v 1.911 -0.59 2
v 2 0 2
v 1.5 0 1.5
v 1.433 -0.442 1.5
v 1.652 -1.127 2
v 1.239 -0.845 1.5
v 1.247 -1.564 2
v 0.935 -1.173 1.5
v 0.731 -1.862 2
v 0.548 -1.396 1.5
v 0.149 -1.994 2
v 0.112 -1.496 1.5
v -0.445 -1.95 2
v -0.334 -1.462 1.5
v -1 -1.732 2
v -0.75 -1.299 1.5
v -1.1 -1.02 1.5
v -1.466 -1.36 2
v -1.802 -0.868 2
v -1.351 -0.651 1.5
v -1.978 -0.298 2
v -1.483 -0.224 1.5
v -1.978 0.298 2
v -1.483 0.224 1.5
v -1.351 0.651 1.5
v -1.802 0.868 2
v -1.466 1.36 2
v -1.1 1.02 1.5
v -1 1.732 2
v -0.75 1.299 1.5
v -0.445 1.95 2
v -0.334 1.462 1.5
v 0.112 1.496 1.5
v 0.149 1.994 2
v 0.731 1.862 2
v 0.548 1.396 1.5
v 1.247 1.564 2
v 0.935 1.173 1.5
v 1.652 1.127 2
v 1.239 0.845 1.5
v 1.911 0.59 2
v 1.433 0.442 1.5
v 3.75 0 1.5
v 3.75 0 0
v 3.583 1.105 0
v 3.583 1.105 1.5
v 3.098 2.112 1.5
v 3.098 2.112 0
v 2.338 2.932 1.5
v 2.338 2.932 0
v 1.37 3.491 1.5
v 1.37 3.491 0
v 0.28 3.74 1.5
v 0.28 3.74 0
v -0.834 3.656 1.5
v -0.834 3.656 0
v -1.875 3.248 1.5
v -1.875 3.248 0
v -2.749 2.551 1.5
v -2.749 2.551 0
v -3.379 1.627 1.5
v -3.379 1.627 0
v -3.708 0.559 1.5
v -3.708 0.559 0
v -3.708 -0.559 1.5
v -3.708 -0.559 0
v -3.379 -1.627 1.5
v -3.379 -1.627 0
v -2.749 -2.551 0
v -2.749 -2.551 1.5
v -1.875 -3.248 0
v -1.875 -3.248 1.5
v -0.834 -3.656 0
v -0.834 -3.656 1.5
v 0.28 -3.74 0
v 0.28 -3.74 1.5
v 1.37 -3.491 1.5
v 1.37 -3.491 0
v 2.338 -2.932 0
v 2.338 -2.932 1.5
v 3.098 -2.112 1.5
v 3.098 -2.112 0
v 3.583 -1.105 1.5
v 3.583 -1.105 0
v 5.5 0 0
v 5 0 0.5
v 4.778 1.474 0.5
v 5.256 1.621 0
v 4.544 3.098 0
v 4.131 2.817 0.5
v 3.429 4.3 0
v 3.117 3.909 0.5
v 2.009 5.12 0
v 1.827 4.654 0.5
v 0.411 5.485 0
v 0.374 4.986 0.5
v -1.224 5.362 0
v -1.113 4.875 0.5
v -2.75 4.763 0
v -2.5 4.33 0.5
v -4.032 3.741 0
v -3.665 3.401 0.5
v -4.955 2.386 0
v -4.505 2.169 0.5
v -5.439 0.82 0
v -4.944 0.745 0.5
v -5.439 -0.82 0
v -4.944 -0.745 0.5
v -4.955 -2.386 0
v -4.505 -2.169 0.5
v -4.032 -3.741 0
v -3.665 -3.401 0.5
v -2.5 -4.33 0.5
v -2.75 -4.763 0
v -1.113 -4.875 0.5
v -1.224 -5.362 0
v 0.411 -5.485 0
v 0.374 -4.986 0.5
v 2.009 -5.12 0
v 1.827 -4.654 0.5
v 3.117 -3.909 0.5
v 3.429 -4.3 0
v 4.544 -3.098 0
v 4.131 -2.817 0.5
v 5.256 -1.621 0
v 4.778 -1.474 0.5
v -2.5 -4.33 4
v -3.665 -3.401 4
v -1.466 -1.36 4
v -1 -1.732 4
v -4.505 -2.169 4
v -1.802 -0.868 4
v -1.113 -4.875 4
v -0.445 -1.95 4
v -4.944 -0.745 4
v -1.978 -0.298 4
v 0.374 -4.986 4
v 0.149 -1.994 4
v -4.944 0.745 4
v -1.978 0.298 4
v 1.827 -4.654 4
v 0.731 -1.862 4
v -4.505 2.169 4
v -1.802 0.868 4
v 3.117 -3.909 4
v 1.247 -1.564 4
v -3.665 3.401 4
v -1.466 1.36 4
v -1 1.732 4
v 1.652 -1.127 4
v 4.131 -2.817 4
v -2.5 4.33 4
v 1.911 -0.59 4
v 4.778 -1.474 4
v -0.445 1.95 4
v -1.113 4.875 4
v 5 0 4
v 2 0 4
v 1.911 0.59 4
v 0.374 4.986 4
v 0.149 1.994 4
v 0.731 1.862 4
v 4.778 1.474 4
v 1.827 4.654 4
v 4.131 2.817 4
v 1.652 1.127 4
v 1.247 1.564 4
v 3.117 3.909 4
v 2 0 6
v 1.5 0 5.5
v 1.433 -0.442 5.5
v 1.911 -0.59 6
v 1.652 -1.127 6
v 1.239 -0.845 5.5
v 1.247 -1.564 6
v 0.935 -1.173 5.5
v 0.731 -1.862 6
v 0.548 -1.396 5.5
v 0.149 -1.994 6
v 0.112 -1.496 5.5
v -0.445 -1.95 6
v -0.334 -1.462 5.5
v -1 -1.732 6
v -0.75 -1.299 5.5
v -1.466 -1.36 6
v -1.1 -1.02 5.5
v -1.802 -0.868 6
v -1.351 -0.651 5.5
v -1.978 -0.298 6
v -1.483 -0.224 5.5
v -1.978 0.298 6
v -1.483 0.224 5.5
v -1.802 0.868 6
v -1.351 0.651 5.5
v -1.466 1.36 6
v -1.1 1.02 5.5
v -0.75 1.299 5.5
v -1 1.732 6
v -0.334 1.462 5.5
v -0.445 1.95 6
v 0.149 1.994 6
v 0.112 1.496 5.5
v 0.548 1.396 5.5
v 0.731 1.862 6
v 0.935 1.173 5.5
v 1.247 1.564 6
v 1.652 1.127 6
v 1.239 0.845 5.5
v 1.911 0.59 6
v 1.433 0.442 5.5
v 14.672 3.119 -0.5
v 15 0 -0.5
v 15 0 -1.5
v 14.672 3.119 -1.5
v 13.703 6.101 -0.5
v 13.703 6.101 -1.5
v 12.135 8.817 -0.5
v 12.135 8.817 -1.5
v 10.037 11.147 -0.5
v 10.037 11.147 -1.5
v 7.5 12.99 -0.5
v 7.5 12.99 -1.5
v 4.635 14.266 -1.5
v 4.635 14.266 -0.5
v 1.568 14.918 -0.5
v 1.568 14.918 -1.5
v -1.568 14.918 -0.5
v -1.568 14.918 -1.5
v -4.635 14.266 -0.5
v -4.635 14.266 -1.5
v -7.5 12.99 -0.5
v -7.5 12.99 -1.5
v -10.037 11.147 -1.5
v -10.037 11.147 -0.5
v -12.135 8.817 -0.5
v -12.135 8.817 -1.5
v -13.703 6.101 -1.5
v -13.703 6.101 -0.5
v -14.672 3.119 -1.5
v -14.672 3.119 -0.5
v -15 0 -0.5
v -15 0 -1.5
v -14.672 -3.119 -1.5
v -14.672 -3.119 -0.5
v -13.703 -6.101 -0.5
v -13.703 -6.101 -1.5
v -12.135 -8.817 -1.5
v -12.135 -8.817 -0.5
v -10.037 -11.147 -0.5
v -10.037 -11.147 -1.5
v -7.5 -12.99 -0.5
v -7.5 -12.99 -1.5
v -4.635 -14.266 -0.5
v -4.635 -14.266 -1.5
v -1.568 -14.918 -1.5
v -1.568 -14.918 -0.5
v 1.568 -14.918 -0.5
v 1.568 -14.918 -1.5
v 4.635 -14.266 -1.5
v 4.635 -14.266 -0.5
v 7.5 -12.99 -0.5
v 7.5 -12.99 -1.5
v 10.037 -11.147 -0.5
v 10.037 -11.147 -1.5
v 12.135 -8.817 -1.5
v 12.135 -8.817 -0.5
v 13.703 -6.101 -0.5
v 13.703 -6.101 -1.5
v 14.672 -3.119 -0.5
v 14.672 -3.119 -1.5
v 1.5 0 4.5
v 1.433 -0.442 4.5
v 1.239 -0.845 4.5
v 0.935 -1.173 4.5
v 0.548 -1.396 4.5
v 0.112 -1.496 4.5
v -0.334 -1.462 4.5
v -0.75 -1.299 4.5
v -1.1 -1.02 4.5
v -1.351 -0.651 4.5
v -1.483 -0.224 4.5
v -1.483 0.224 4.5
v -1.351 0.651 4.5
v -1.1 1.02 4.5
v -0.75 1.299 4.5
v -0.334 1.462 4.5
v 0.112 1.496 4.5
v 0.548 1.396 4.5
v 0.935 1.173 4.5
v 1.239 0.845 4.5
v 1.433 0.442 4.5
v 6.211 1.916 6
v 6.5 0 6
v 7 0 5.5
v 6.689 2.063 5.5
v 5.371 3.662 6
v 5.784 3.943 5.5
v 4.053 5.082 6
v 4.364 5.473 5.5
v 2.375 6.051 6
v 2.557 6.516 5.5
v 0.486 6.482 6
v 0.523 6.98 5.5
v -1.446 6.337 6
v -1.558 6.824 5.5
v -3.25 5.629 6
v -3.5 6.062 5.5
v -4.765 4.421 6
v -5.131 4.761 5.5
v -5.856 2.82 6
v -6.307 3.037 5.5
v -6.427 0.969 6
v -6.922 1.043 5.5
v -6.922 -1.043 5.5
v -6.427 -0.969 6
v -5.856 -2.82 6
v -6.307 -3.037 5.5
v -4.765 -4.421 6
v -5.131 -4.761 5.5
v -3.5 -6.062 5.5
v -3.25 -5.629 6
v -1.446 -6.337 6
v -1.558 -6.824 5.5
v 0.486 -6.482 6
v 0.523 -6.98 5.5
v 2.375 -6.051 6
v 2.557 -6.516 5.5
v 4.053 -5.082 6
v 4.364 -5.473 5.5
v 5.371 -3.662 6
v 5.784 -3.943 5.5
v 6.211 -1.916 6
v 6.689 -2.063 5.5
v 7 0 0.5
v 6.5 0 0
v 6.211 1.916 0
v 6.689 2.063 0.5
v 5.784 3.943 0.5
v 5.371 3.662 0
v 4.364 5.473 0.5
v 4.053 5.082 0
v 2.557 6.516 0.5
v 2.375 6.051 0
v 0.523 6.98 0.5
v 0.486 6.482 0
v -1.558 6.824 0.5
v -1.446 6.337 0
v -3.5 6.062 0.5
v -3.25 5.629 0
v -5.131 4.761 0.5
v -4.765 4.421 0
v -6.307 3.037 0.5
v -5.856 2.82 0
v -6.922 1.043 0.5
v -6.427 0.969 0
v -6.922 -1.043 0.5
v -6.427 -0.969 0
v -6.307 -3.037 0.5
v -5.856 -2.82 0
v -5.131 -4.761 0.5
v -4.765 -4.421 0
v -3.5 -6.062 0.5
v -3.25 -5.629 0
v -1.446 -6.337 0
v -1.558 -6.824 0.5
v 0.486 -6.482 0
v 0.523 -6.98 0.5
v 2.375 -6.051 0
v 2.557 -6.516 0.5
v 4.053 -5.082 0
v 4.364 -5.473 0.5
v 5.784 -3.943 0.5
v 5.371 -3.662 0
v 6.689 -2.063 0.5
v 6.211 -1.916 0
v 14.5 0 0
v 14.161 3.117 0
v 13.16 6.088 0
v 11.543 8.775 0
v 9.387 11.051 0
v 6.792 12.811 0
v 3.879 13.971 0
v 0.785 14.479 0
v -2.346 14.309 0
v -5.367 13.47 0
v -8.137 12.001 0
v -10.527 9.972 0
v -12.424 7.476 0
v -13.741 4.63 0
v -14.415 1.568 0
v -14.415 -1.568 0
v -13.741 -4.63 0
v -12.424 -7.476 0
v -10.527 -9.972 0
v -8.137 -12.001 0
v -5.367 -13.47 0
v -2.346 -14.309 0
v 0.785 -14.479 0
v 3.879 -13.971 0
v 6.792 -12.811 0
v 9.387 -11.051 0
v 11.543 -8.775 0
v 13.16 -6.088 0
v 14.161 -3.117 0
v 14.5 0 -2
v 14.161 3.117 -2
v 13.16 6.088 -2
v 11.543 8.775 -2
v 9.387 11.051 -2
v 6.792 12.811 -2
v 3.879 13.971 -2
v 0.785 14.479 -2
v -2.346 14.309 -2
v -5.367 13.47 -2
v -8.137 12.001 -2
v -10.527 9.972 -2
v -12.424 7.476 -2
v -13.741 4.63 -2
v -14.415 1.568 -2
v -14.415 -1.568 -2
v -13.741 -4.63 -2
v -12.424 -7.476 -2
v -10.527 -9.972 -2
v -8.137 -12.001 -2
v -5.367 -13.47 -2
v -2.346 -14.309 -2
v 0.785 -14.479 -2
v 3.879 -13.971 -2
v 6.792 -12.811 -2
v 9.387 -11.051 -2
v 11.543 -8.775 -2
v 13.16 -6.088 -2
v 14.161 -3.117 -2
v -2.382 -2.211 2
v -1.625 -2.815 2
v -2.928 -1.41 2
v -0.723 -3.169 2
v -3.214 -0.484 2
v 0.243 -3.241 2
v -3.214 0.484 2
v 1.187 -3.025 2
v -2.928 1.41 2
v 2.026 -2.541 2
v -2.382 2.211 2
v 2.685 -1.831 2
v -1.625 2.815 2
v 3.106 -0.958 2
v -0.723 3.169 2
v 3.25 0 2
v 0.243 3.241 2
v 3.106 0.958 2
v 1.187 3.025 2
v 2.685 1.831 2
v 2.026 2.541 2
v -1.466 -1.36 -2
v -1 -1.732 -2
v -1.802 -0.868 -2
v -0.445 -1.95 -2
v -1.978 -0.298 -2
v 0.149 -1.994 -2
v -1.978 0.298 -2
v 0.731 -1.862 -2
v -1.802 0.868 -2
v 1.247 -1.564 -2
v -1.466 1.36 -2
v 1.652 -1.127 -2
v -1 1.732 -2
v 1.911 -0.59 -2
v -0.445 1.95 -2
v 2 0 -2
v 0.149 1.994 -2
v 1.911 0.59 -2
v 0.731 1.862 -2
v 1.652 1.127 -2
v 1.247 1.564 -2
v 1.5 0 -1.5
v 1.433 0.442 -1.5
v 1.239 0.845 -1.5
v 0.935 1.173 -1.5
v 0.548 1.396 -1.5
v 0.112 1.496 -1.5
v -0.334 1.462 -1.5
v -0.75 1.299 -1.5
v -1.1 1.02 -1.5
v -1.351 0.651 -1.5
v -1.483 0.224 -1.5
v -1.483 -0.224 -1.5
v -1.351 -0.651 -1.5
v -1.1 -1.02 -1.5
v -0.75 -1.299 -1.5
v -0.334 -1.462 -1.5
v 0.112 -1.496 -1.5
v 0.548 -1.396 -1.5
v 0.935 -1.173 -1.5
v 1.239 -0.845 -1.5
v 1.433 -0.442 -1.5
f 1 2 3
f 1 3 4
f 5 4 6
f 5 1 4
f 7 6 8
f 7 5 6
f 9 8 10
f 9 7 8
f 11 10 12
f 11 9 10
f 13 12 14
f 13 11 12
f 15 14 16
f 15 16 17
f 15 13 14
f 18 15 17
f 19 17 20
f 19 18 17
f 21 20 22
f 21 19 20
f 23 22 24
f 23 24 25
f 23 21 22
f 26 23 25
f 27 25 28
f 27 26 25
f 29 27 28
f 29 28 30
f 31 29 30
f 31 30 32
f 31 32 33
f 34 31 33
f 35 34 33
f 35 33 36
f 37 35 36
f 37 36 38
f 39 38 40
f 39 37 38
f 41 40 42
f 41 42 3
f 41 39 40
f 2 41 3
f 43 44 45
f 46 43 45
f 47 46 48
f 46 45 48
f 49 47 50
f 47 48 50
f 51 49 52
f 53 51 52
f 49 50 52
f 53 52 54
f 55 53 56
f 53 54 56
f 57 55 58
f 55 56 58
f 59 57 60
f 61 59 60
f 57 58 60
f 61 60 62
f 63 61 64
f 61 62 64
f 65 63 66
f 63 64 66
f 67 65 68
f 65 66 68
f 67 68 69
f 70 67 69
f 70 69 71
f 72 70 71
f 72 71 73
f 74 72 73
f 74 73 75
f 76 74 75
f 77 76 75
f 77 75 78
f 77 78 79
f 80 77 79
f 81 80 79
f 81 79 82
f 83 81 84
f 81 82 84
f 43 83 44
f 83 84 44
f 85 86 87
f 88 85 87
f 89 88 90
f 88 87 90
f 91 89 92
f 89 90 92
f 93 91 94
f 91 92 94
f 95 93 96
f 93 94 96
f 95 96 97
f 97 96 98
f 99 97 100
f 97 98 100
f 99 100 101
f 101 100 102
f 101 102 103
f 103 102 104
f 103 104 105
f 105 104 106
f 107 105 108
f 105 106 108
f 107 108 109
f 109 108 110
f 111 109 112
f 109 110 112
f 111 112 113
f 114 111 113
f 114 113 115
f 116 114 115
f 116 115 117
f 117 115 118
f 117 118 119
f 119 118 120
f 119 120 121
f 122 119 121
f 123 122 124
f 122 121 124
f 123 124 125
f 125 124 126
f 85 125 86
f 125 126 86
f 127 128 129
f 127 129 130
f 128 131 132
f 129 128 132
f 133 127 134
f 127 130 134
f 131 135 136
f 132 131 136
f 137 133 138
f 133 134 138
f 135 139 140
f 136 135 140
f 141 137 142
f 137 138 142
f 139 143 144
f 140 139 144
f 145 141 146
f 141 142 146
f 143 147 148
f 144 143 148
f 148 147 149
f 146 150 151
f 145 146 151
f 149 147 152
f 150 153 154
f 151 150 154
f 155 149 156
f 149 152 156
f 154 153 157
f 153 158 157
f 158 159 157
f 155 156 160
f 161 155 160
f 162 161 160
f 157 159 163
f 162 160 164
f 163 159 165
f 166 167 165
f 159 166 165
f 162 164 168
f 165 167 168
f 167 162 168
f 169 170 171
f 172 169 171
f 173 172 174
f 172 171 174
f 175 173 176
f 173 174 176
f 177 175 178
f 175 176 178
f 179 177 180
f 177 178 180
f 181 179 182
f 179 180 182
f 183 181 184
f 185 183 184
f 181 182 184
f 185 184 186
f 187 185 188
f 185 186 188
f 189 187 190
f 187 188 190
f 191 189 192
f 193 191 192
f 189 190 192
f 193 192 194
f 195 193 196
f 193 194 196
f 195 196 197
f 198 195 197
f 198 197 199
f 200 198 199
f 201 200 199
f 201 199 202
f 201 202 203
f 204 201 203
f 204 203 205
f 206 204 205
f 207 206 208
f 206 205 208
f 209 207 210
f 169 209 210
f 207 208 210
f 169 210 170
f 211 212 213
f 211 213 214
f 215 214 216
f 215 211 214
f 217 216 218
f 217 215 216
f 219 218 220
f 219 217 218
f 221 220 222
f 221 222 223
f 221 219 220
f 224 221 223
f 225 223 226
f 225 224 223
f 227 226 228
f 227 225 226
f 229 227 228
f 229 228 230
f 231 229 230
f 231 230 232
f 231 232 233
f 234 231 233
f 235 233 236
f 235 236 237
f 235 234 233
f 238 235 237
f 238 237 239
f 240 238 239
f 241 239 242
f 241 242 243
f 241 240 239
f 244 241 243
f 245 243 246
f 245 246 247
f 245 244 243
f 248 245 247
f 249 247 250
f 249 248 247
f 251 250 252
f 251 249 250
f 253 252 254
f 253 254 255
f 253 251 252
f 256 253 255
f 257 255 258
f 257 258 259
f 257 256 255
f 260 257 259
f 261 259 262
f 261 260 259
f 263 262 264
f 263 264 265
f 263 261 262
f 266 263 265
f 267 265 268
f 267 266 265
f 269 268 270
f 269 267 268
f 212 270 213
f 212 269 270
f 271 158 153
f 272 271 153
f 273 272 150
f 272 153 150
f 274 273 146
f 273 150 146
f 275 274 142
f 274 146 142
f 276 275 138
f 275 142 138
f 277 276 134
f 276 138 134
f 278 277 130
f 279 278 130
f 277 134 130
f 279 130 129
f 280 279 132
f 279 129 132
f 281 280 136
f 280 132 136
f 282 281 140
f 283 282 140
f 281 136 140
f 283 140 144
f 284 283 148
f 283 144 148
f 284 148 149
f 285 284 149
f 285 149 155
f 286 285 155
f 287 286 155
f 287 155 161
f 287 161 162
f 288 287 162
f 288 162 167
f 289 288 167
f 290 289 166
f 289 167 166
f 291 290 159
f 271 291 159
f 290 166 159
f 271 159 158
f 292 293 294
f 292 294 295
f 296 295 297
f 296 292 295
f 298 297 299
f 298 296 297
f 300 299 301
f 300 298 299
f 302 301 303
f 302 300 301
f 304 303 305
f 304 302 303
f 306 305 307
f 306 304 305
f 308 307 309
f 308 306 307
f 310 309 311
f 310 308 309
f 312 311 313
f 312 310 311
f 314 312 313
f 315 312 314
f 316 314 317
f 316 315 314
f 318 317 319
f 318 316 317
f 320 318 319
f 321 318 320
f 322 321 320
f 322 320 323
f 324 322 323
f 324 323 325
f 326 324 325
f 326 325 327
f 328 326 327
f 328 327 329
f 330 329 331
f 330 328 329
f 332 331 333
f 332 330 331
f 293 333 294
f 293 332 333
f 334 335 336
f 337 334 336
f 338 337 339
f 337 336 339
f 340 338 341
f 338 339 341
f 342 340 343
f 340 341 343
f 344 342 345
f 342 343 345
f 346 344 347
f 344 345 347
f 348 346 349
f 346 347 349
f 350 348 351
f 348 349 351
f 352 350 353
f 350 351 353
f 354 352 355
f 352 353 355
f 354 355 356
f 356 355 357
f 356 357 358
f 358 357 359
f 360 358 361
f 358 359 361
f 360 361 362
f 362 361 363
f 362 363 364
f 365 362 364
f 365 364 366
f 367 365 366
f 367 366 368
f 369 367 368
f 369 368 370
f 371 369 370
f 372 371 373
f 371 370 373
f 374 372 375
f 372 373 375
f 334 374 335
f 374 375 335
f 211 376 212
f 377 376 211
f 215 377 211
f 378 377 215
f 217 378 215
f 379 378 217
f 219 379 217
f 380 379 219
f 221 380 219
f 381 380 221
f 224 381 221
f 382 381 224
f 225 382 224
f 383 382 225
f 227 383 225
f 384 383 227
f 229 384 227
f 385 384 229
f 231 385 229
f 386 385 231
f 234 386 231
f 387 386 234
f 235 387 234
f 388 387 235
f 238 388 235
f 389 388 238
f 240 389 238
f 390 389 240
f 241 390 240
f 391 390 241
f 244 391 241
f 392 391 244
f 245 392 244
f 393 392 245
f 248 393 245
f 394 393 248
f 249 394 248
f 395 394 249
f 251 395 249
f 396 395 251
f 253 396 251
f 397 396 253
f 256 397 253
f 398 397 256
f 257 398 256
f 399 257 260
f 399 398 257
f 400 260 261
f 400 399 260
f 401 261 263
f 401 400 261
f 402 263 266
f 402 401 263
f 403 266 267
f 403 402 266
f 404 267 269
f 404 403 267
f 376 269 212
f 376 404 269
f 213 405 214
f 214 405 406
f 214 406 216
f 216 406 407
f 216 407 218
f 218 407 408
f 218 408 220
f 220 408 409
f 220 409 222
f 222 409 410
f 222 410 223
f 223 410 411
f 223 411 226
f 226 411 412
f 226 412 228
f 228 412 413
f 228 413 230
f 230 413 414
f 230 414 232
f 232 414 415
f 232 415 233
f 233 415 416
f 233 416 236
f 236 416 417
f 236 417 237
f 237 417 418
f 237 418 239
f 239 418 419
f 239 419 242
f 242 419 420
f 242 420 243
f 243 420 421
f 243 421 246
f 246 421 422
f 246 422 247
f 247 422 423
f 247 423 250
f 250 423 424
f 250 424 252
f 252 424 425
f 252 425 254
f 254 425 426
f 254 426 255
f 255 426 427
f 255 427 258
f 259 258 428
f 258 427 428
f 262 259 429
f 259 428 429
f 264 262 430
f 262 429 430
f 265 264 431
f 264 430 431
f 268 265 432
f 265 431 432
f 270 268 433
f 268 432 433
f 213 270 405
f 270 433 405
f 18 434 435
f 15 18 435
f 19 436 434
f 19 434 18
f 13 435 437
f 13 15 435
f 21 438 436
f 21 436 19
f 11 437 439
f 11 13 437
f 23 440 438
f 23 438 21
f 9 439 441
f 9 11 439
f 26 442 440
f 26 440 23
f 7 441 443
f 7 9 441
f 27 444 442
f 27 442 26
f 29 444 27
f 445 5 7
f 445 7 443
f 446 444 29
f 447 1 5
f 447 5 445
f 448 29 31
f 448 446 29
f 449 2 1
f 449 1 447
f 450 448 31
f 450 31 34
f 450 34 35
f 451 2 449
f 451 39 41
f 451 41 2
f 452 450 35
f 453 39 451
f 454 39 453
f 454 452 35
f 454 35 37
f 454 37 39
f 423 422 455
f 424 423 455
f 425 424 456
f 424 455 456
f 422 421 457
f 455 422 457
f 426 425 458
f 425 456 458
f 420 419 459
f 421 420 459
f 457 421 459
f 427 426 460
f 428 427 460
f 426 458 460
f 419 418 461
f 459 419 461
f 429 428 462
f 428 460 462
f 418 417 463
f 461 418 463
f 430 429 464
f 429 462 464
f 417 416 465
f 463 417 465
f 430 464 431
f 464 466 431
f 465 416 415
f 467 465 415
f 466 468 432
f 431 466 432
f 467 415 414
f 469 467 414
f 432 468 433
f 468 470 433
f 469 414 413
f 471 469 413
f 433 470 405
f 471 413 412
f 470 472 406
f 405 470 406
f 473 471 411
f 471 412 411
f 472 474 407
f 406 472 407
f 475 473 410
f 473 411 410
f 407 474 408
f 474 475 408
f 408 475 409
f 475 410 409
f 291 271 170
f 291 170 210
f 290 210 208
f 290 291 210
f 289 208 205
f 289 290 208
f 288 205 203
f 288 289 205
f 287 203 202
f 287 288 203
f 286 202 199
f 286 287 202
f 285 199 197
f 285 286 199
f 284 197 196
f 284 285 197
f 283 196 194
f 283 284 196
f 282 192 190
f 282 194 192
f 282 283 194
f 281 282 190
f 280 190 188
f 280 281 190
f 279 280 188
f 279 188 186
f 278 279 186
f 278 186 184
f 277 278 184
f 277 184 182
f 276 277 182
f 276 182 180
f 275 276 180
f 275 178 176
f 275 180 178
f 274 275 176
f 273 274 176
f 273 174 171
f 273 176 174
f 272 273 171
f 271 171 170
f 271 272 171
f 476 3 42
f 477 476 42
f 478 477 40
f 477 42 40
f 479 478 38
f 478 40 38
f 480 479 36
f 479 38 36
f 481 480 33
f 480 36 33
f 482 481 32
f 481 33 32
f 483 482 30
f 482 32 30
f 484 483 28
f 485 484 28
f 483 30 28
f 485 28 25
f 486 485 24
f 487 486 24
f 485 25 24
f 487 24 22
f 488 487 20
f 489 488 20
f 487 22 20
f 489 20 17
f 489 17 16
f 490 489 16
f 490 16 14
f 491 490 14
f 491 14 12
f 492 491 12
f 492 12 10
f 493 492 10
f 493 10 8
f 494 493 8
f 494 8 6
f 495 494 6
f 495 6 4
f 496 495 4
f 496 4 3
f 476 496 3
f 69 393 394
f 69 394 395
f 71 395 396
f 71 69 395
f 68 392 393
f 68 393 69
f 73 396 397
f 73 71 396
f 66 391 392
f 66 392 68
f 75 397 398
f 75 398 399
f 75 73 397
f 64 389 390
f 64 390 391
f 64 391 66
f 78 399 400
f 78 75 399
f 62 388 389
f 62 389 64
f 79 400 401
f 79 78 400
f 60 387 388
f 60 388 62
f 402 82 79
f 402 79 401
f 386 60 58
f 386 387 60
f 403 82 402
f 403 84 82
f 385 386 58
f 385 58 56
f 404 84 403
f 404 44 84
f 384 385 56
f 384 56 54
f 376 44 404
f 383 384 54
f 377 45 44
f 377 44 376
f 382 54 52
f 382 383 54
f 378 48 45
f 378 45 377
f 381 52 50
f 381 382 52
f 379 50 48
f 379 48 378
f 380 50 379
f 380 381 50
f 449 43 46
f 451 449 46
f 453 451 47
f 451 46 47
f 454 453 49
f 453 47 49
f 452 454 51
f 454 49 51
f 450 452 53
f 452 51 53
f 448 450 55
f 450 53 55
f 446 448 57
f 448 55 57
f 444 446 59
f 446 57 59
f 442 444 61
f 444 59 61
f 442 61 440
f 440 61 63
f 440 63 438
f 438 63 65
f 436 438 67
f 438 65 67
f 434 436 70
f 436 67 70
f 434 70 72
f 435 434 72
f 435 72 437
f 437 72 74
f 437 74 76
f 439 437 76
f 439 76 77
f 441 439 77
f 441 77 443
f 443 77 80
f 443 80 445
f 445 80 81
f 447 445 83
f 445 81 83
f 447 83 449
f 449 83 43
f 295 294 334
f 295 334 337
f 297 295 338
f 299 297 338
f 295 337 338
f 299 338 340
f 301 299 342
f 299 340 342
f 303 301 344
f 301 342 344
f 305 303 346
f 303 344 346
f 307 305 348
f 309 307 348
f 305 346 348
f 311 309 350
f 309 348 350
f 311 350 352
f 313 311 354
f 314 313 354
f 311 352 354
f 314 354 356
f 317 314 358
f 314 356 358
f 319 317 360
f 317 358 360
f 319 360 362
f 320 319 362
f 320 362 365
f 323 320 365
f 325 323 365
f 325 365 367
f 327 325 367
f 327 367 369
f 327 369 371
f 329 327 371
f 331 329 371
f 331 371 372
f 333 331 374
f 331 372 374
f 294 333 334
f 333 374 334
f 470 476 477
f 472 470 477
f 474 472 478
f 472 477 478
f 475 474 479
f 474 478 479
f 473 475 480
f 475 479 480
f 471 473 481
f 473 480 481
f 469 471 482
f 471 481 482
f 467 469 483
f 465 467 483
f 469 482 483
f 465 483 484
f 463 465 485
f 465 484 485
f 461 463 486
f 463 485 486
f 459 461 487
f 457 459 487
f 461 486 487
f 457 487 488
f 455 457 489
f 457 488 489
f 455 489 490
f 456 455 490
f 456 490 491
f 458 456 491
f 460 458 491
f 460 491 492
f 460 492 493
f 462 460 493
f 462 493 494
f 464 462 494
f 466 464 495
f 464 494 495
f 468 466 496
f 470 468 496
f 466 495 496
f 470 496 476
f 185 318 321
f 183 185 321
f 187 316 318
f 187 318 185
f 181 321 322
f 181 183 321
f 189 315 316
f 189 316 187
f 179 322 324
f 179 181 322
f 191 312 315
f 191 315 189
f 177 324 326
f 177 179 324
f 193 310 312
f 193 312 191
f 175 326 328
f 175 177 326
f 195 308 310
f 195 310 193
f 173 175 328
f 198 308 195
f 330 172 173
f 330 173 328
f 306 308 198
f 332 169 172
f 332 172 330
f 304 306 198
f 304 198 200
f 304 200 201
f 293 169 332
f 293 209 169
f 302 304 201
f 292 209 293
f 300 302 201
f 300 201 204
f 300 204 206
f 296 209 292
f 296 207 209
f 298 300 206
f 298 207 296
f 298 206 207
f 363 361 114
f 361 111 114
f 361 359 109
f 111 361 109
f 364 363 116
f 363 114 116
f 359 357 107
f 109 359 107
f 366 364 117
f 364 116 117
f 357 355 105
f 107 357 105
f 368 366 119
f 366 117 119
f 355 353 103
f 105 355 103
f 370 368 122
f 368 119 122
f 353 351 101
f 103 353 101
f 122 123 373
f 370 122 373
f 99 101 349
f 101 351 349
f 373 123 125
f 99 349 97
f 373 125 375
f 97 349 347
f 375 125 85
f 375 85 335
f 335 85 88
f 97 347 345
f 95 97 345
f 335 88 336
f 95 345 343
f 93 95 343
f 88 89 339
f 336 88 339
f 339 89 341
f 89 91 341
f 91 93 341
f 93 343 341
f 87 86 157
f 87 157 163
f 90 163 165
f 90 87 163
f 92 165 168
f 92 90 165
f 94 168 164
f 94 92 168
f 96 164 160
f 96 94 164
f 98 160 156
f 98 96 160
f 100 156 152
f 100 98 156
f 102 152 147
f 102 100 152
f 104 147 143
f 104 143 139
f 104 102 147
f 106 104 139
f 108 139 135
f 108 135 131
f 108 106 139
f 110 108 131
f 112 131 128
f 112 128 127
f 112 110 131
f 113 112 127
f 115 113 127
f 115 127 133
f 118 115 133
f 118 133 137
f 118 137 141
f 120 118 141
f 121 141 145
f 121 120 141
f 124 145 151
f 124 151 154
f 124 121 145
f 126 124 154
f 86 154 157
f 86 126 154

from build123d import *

# Parameters (mm, degrees)
SKETCH_R             = 15
PAD_DEPTH            = 2
SKETCH001_R          = 3.75
PAD001_DEPTH         = 2
SKETCH002_R          = 1.5
POCKET_DEPTH         = 2.001
POCKET_DEPTH_BACK    = -2.001
CHAMFER_SIZE         = 0.5
SKETCH003_R          = 7
PAD002_DEPTH         = 6
SKETCH004_R          = 5
POCKET001_DEPTH      = 4
SKETCH005_R          = 1.5
POCKET002_DEPTH      = 0.001
POCKET002_DEPTH_BACK = -6.001
CHAMFER001_SIZE      = 0.5


with BuildPart() as scheibe_oben:
    # Sketch → Pad (new body)
    with BuildSketch(Plane.XY):
        Circle(SKETCH_R)
    extrude(amount=-PAD_DEPTH)

    # Sketch001 → Pad001 (join)
    with BuildSketch(Plane.XY):
        Circle(SKETCH001_R)
    extrude(amount=PAD001_DEPTH)

    # Sketch002 → Pocket (cut, two sides)
    with BuildSketch(Plane.XY) as pocket_sk:
        Circle(SKETCH002_R)
    extrude(amount=-POCKET_DEPTH, mode=Mode.SUBTRACT)
    extrude(pocket_sk.sketch, amount=-POCKET_DEPTH_BACK, mode=Mode.SUBTRACT)

    # Chamfer
    chamfer_edges = [scheibe_oben.edges().sort_by_distance(p)[0] for p in [
        (-3.75, 0, 2),
        (-15, 0, 0),
        (-15, 0, -2),
        (-1.5, 0, 2),
        (-1.5, 0, -2),
    ]]
    chamfer(chamfer_edges, length=CHAMFER_SIZE)


with BuildPart() as seitlich:
    # Sketch003 → Pad002 (new body)
    with BuildSketch(Plane.XY):
        Circle(SKETCH003_R)
    extrude(amount=PAD002_DEPTH)

    # Sketch004 → Pocket001 (cut)
    with BuildSketch(Plane.XY):
        Circle(SKETCH004_R)
    extrude(amount=POCKET001_DEPTH, mode=Mode.SUBTRACT)

    # Sketch005 → Pocket002 (cut, two sides)
    with BuildSketch(Plane.XY) as pocket002_sk:
        Circle(SKETCH005_R)
    extrude(amount=-POCKET002_DEPTH, mode=Mode.SUBTRACT)
    extrude(pocket002_sk.sketch, amount=-POCKET002_DEPTH_BACK, mode=Mode.SUBTRACT)

    # Chamfer001
    chamfer001_edges = [seitlich.edges().sort_by_distance(p)[0] for p in [
        (-7, 0, 0),
        (-5, 0, 0),
        (-7, 0, 6),
        (-1.5, 0, 6),
        (-1.5, 0, 4),
    ]]
    chamfer(chamfer001_edges, length=CHAMFER001_SIZE)


solid = Compound([scheibe_oben.part, seitlich.part])
